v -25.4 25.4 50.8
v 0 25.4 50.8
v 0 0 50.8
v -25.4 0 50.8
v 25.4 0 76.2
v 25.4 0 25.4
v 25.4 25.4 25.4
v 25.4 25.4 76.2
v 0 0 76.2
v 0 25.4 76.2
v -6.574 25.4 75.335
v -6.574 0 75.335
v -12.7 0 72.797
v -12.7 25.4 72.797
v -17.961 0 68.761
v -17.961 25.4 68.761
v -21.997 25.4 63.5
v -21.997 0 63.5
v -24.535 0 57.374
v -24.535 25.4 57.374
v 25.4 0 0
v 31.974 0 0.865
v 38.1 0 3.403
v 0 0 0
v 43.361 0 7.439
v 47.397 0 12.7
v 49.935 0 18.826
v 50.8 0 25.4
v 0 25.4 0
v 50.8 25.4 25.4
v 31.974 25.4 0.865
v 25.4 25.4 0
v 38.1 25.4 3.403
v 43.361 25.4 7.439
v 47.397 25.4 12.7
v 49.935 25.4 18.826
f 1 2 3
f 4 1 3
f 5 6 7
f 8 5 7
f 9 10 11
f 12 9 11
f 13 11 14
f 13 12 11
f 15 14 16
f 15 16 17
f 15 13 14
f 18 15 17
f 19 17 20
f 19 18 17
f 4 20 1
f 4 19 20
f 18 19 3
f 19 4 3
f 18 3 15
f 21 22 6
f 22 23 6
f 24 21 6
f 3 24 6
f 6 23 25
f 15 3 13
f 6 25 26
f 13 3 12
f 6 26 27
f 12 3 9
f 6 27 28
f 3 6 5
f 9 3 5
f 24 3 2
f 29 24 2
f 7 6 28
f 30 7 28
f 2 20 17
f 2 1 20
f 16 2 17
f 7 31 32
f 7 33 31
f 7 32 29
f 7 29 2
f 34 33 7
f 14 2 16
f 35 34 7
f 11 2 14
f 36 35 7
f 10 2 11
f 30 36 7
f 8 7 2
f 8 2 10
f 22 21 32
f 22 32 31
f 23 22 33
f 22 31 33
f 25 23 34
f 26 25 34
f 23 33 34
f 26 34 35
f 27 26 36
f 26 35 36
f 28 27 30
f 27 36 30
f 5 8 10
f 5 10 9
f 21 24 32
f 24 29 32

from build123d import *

# Parameters (mm, degrees)
F0_W     = 50.8
F0_H     = 25.4
F1_DEPTH = 25.4
F2_W     = 25.4
F2_H     = 25.4
F3_DEPTH = 50.8
F4_W     = 25.4
F4_H     = 25.4
F5_DEPTH = 25.4
F6_R     = 25.39999


# Not quite as in the source:
# - a fillet or chamfer is up to 0.001 mm smaller than in the source, because OpenCascade refuses the exact size


with BuildPart() as f1:
    # F0 (on Top) → F1 (new body)
    with BuildSketch(Plane.XY):
        with Locations((25.4, 12.7)):
            Rectangle(F0_W, F0_H)
    extrude(amount=F1_DEPTH)

    # F2 (on face) → F3 (join)
    with BuildSketch(Plane.XY.offset(25.4)):
        with Locations((12.7, 12.7)):
            Rectangle(F2_W, F2_H)
    extrude(amount=F3_DEPTH)

    # F4 (on face) → F5 (join)
    with BuildSketch(Plane(origin=(0, 0, 0), x_dir=(0, -1, 0), z_dir=(-1, 0, 0))):
        with Locations((-12.7, 63.5)):
            Rectangle(F4_W, F4_H)
    extrude(amount=F5_DEPTH)

    # F6 (radius 25.4 in the source; OpenCascade refuses exactly that, so slightly less here)
    f6_edges = [f1.edges().sort_by_distance(p)[0] for p in [
        (50.8, 12.7, 0),
        (-25.4, 12.7, 76.2),
    ]]
    fillet(f6_edges, radius=F6_R)


solid = f1.part
